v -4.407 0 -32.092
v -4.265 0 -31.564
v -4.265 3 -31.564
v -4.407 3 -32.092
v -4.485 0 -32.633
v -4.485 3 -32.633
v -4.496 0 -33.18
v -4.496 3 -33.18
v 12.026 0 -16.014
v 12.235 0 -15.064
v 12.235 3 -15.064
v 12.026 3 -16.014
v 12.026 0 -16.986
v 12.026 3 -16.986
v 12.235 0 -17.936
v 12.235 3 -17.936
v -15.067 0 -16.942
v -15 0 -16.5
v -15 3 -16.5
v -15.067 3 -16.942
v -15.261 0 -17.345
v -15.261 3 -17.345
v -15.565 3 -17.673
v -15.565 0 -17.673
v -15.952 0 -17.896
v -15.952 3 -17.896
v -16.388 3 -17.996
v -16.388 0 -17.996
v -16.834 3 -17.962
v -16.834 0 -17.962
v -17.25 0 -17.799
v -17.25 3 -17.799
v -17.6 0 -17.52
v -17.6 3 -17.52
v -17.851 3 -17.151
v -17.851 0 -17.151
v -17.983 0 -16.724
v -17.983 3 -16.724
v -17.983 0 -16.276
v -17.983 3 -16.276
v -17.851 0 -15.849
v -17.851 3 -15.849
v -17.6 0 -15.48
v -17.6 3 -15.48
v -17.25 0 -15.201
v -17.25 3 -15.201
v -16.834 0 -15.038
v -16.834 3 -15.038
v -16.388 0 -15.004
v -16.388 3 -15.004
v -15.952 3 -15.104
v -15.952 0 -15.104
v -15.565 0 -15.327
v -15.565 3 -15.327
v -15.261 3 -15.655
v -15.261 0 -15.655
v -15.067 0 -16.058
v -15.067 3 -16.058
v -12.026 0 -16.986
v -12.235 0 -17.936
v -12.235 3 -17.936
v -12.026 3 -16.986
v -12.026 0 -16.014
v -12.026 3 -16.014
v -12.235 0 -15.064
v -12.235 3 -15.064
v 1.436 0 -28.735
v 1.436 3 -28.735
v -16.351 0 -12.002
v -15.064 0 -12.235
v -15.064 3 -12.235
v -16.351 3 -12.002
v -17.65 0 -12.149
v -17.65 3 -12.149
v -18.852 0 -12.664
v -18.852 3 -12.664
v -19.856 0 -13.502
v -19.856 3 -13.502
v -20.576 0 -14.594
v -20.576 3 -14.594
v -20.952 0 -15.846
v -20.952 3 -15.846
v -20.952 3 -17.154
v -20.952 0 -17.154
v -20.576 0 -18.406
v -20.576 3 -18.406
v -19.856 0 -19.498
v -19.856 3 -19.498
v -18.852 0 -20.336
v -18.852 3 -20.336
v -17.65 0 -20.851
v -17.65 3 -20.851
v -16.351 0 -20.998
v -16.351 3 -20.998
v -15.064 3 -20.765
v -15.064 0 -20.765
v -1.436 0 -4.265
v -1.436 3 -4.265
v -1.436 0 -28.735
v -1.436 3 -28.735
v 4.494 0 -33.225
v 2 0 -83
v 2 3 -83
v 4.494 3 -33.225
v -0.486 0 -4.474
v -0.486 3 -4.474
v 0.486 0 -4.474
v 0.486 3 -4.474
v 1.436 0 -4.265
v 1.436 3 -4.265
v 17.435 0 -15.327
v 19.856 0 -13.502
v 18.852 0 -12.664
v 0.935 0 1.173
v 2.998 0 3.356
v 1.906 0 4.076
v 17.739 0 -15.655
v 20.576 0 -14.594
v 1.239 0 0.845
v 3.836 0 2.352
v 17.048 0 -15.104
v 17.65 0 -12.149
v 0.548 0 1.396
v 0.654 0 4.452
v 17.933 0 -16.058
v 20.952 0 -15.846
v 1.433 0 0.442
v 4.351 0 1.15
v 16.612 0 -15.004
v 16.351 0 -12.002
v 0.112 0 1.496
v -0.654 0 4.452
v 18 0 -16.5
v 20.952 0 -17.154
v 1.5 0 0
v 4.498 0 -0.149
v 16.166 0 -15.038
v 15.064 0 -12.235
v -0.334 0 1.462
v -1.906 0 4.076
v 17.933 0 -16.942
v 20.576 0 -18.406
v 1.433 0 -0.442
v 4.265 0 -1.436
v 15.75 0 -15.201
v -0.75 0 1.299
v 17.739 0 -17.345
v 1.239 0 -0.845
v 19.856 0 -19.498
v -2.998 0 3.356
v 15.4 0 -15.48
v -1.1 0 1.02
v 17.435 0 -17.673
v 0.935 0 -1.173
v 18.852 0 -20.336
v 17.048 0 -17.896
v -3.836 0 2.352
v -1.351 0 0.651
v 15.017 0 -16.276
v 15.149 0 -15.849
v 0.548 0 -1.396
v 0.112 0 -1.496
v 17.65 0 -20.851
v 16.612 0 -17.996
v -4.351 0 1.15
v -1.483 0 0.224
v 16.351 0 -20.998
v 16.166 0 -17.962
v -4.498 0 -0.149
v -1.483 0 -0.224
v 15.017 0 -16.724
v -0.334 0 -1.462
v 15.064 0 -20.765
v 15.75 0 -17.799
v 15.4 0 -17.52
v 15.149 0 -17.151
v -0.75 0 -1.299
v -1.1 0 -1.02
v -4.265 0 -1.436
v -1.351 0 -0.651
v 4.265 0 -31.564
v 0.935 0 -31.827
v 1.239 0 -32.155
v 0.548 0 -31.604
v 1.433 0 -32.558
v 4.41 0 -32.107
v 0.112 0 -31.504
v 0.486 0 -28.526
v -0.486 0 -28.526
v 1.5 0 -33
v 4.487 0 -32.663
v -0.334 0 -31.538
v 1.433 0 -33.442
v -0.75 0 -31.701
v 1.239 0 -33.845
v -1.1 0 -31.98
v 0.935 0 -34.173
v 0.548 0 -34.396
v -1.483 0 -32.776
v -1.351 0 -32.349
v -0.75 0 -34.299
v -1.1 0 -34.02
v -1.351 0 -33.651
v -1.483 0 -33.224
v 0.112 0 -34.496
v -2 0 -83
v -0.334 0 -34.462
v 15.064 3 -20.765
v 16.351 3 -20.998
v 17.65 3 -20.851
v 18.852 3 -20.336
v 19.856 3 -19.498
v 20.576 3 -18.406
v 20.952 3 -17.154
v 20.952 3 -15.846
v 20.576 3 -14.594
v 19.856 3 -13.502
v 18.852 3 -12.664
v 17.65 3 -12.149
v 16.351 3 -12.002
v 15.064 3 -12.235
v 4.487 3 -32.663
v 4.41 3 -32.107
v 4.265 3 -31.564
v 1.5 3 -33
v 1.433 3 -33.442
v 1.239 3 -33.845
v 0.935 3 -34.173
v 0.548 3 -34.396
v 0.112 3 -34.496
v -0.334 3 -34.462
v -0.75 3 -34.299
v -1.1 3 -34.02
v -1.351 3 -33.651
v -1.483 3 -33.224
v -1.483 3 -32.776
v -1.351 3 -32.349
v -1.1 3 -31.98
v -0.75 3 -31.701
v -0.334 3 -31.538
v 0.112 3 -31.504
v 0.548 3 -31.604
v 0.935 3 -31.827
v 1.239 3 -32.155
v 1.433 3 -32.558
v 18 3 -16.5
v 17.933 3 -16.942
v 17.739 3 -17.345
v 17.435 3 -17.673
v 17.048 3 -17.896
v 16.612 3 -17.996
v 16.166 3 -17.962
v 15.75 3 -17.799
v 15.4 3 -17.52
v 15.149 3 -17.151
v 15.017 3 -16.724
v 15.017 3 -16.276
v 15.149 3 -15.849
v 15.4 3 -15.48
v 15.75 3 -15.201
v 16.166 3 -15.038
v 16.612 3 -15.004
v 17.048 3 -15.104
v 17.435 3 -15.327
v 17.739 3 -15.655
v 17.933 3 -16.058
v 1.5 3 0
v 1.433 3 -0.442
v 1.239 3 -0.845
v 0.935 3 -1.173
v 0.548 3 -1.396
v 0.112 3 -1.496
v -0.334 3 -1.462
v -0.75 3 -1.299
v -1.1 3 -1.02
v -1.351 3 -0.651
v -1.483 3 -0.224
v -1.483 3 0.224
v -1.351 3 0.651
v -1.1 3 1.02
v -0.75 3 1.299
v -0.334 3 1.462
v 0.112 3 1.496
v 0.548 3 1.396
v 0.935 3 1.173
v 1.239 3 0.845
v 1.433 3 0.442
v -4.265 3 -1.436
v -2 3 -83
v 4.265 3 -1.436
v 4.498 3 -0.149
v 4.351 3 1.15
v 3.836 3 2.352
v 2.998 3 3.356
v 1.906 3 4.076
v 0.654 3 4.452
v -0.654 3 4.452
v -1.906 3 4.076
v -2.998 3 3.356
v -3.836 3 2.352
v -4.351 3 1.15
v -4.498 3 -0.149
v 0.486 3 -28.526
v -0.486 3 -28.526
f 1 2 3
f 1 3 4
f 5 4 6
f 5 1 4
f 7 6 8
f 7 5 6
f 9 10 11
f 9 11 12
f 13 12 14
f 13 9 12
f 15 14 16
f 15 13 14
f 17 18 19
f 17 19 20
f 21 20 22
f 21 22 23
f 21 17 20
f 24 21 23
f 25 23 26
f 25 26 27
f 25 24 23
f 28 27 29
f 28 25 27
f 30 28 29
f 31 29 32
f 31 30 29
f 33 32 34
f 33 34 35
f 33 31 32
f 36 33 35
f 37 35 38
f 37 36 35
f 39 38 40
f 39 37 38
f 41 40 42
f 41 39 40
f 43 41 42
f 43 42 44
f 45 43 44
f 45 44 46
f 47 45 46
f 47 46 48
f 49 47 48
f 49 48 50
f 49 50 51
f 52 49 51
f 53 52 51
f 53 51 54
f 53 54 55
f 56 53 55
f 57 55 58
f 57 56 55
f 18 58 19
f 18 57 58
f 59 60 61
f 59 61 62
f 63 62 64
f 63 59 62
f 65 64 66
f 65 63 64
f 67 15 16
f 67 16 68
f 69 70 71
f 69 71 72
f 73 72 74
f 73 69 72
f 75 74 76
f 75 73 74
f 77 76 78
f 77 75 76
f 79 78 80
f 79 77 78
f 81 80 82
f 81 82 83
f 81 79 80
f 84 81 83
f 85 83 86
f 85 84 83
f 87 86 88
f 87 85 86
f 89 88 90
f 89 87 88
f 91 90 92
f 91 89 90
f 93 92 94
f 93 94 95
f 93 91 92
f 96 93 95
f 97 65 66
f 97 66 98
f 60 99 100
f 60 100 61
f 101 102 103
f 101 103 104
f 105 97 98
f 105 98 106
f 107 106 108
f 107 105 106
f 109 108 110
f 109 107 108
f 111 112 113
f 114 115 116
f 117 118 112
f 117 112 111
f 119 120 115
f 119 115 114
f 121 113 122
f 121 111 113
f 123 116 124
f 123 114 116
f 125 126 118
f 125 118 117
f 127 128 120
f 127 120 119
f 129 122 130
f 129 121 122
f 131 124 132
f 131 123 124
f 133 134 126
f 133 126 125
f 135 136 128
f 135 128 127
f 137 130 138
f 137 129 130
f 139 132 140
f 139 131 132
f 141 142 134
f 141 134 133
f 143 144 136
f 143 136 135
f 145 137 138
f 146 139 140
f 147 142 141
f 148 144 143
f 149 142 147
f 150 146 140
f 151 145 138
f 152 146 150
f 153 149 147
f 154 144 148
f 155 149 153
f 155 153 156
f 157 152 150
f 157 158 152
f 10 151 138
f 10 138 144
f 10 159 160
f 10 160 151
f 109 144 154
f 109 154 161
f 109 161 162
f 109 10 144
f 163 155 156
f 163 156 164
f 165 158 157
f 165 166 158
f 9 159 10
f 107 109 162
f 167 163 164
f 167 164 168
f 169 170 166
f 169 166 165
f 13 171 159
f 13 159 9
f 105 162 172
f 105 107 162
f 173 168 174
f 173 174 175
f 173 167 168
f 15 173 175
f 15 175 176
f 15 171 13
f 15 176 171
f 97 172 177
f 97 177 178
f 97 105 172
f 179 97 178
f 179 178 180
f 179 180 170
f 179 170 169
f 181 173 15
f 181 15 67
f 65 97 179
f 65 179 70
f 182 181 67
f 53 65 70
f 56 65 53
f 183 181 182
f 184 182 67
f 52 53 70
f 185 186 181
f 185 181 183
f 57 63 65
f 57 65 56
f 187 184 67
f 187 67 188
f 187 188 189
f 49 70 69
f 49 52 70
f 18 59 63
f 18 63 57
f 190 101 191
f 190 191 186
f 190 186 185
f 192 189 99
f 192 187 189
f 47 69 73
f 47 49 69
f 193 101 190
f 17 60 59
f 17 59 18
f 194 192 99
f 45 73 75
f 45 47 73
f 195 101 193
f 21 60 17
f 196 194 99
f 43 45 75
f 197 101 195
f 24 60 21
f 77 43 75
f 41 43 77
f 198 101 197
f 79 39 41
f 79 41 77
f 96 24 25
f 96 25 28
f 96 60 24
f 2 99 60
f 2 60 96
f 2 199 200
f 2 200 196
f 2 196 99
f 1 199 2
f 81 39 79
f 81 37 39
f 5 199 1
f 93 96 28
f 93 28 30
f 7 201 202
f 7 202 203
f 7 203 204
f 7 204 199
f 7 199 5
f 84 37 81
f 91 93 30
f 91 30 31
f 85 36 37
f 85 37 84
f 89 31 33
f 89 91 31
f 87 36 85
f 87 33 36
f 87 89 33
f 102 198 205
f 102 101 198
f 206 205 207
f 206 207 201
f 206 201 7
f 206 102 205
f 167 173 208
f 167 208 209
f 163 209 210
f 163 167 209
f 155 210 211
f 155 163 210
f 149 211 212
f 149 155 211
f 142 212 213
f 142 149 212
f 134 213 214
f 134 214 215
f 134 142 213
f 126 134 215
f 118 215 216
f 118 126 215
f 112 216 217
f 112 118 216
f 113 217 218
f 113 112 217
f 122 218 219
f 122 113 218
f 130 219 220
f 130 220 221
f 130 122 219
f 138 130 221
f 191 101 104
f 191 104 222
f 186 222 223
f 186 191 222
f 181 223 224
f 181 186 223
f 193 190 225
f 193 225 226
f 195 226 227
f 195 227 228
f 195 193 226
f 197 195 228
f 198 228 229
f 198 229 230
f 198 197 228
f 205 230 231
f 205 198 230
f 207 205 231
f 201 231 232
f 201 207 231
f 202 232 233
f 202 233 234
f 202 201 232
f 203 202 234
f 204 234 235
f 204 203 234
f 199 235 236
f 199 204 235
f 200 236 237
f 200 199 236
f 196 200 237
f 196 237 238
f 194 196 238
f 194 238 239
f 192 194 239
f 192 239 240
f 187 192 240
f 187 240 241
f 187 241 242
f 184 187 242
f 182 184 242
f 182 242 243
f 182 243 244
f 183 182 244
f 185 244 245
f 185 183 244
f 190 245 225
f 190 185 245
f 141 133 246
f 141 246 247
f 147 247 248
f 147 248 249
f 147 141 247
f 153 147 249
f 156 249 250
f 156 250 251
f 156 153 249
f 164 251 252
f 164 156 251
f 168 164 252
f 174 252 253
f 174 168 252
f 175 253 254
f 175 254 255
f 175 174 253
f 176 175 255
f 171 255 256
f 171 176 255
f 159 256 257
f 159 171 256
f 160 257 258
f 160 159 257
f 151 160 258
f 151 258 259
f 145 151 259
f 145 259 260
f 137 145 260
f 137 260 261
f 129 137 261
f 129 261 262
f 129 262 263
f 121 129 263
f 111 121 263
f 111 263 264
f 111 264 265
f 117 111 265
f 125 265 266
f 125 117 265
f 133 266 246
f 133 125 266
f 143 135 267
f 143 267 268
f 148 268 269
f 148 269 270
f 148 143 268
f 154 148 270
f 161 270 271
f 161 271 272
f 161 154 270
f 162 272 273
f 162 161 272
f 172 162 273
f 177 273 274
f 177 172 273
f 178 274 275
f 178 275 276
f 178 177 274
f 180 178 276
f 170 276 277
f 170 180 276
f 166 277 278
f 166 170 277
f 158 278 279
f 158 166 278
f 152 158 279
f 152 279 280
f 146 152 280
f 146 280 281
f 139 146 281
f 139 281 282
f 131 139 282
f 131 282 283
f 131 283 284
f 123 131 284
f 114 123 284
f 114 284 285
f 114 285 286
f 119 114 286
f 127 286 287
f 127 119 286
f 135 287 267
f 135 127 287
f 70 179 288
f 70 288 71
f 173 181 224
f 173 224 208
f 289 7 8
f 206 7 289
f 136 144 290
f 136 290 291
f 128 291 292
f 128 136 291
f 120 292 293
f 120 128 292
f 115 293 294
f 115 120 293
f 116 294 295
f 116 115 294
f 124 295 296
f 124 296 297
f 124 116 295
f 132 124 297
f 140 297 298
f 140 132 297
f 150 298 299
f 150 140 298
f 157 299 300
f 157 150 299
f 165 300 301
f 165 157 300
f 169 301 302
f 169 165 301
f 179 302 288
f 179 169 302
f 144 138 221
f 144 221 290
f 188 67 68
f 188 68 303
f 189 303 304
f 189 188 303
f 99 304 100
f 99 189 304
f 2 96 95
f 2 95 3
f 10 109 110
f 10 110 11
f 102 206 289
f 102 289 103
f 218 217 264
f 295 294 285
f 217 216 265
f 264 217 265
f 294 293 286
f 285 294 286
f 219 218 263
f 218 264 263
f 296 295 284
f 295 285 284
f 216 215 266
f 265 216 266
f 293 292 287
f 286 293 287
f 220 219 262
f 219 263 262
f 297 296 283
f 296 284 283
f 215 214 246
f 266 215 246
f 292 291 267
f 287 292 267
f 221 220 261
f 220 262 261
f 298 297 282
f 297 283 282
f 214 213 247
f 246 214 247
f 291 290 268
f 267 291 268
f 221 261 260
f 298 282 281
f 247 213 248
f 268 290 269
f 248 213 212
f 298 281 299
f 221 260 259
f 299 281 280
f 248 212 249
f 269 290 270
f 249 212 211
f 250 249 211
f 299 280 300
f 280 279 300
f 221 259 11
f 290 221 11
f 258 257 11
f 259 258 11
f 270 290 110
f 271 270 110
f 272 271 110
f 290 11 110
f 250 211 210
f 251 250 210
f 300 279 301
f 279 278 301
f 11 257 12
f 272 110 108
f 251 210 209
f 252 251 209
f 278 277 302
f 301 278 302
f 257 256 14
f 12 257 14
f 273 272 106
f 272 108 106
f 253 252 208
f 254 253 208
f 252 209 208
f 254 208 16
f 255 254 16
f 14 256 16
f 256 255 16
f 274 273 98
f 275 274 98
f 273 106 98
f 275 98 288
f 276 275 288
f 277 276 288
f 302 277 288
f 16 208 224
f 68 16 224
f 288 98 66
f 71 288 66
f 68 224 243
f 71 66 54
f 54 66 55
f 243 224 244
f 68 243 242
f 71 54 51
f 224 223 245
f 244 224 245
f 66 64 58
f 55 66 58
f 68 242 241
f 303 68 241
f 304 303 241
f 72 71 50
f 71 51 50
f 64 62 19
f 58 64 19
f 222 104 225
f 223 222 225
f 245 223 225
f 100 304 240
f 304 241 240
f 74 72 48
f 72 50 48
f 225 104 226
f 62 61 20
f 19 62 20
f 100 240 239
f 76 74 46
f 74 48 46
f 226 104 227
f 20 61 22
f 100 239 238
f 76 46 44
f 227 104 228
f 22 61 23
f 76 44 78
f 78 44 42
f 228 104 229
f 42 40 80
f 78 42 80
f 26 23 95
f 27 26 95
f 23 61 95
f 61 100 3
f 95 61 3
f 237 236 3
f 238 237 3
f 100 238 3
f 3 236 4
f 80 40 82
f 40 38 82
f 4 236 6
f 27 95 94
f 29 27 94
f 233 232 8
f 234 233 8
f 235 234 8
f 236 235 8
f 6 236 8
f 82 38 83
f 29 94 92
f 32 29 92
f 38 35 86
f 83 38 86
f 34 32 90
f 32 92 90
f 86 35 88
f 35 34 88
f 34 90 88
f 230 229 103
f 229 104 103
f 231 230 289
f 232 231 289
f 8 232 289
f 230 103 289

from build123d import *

# Parameters (mm, degrees)
SKETCH1_R           = 1.5
BOSS_EXTRUDE1_DEPTH = 3


with BuildPart() as part:
    # Sketch1 → Boss-Extrude1 (new body)
    with BuildSketch(Plane(origin=(0, 0, 0), x_dir=(1, 0, 0), z_dir=(0, 1, 0))):
        with BuildLine():
            Line((-2, 83), (2, 83))
            Line((2, 83), (4.494360181, 33.225225593))
            ThreePointArc((4.494360181, 33.225225593), (4.457597858, 32.38370353), (4.264652125, 31.563775))
            Line((4.264652125, 31.563775), (15.063775, 20.764652125))
            ThreePointArc((15.063775, 20.764652125), (21, 16.5), (15.063775, 12.235347875))
            Line((15.063775, 12.235347875), (4.264652125, 1.436225))
            ThreePointArc((4.264652125, 1.436225), (0, -4.5), (-4.264652125, 1.436225))
            Line((-4.264652125, 1.436225), (-15.063775, 12.235347875))
            ThreePointArc((-15.063775, 12.235347875), (-21, 16.5), (-15.063775, 20.764652125))
            Line((-15.063775, 20.764652125), (-4.264652125, 31.563775))
            ThreePointArc((-4.264652125, 31.563775), (-4.454454203, 32.361378239), (-4.496391332, 33.180180433))
            Line((-4.496391332, 33.180180433), (-2, 83))
        make_face()
        Circle(SKETCH1_R, mode=Mode.SUBTRACT)
        with Locations((0, 33)):
            Circle(SKETCH1_R, mode=Mode.SUBTRACT)
        with Locations((-16.5, 16.5)):
            Circle(SKETCH1_R, mode=Mode.SUBTRACT)
        with Locations((16.5, 16.5)):
            Circle(SKETCH1_R, mode=Mode.SUBTRACT)
        with BuildLine():
            Line((12.235347875, 17.936225), (1.436225, 28.735347875))
            ThreePointArc((1.436225, 28.735347875), (0, 28.5), (-1.436225, 28.735347875))
            Line((-1.436225, 28.735347875), (-12.235347875, 17.936225))
            ThreePointArc((-12.235347875, 17.936225), (-12, 16.5), (-12.235347875, 15.063775))
            Line((-12.235347875, 15.063775), (-1.436225, 4.264652125))
            ThreePointArc((-1.436225, 4.264652125), (0, 4.5), (1.436225, 4.264652125))
            Line((1.436225, 4.264652125), (12.235347875, 15.063775))
            ThreePointArc((12.235347875, 15.063775), (12, 16.5), (12.235347875, 17.936225))
        make_face(mode=Mode.SUBTRACT)
    extrude(amount=BOSS_EXTRUDE1_DEPTH)


solid = part.part
